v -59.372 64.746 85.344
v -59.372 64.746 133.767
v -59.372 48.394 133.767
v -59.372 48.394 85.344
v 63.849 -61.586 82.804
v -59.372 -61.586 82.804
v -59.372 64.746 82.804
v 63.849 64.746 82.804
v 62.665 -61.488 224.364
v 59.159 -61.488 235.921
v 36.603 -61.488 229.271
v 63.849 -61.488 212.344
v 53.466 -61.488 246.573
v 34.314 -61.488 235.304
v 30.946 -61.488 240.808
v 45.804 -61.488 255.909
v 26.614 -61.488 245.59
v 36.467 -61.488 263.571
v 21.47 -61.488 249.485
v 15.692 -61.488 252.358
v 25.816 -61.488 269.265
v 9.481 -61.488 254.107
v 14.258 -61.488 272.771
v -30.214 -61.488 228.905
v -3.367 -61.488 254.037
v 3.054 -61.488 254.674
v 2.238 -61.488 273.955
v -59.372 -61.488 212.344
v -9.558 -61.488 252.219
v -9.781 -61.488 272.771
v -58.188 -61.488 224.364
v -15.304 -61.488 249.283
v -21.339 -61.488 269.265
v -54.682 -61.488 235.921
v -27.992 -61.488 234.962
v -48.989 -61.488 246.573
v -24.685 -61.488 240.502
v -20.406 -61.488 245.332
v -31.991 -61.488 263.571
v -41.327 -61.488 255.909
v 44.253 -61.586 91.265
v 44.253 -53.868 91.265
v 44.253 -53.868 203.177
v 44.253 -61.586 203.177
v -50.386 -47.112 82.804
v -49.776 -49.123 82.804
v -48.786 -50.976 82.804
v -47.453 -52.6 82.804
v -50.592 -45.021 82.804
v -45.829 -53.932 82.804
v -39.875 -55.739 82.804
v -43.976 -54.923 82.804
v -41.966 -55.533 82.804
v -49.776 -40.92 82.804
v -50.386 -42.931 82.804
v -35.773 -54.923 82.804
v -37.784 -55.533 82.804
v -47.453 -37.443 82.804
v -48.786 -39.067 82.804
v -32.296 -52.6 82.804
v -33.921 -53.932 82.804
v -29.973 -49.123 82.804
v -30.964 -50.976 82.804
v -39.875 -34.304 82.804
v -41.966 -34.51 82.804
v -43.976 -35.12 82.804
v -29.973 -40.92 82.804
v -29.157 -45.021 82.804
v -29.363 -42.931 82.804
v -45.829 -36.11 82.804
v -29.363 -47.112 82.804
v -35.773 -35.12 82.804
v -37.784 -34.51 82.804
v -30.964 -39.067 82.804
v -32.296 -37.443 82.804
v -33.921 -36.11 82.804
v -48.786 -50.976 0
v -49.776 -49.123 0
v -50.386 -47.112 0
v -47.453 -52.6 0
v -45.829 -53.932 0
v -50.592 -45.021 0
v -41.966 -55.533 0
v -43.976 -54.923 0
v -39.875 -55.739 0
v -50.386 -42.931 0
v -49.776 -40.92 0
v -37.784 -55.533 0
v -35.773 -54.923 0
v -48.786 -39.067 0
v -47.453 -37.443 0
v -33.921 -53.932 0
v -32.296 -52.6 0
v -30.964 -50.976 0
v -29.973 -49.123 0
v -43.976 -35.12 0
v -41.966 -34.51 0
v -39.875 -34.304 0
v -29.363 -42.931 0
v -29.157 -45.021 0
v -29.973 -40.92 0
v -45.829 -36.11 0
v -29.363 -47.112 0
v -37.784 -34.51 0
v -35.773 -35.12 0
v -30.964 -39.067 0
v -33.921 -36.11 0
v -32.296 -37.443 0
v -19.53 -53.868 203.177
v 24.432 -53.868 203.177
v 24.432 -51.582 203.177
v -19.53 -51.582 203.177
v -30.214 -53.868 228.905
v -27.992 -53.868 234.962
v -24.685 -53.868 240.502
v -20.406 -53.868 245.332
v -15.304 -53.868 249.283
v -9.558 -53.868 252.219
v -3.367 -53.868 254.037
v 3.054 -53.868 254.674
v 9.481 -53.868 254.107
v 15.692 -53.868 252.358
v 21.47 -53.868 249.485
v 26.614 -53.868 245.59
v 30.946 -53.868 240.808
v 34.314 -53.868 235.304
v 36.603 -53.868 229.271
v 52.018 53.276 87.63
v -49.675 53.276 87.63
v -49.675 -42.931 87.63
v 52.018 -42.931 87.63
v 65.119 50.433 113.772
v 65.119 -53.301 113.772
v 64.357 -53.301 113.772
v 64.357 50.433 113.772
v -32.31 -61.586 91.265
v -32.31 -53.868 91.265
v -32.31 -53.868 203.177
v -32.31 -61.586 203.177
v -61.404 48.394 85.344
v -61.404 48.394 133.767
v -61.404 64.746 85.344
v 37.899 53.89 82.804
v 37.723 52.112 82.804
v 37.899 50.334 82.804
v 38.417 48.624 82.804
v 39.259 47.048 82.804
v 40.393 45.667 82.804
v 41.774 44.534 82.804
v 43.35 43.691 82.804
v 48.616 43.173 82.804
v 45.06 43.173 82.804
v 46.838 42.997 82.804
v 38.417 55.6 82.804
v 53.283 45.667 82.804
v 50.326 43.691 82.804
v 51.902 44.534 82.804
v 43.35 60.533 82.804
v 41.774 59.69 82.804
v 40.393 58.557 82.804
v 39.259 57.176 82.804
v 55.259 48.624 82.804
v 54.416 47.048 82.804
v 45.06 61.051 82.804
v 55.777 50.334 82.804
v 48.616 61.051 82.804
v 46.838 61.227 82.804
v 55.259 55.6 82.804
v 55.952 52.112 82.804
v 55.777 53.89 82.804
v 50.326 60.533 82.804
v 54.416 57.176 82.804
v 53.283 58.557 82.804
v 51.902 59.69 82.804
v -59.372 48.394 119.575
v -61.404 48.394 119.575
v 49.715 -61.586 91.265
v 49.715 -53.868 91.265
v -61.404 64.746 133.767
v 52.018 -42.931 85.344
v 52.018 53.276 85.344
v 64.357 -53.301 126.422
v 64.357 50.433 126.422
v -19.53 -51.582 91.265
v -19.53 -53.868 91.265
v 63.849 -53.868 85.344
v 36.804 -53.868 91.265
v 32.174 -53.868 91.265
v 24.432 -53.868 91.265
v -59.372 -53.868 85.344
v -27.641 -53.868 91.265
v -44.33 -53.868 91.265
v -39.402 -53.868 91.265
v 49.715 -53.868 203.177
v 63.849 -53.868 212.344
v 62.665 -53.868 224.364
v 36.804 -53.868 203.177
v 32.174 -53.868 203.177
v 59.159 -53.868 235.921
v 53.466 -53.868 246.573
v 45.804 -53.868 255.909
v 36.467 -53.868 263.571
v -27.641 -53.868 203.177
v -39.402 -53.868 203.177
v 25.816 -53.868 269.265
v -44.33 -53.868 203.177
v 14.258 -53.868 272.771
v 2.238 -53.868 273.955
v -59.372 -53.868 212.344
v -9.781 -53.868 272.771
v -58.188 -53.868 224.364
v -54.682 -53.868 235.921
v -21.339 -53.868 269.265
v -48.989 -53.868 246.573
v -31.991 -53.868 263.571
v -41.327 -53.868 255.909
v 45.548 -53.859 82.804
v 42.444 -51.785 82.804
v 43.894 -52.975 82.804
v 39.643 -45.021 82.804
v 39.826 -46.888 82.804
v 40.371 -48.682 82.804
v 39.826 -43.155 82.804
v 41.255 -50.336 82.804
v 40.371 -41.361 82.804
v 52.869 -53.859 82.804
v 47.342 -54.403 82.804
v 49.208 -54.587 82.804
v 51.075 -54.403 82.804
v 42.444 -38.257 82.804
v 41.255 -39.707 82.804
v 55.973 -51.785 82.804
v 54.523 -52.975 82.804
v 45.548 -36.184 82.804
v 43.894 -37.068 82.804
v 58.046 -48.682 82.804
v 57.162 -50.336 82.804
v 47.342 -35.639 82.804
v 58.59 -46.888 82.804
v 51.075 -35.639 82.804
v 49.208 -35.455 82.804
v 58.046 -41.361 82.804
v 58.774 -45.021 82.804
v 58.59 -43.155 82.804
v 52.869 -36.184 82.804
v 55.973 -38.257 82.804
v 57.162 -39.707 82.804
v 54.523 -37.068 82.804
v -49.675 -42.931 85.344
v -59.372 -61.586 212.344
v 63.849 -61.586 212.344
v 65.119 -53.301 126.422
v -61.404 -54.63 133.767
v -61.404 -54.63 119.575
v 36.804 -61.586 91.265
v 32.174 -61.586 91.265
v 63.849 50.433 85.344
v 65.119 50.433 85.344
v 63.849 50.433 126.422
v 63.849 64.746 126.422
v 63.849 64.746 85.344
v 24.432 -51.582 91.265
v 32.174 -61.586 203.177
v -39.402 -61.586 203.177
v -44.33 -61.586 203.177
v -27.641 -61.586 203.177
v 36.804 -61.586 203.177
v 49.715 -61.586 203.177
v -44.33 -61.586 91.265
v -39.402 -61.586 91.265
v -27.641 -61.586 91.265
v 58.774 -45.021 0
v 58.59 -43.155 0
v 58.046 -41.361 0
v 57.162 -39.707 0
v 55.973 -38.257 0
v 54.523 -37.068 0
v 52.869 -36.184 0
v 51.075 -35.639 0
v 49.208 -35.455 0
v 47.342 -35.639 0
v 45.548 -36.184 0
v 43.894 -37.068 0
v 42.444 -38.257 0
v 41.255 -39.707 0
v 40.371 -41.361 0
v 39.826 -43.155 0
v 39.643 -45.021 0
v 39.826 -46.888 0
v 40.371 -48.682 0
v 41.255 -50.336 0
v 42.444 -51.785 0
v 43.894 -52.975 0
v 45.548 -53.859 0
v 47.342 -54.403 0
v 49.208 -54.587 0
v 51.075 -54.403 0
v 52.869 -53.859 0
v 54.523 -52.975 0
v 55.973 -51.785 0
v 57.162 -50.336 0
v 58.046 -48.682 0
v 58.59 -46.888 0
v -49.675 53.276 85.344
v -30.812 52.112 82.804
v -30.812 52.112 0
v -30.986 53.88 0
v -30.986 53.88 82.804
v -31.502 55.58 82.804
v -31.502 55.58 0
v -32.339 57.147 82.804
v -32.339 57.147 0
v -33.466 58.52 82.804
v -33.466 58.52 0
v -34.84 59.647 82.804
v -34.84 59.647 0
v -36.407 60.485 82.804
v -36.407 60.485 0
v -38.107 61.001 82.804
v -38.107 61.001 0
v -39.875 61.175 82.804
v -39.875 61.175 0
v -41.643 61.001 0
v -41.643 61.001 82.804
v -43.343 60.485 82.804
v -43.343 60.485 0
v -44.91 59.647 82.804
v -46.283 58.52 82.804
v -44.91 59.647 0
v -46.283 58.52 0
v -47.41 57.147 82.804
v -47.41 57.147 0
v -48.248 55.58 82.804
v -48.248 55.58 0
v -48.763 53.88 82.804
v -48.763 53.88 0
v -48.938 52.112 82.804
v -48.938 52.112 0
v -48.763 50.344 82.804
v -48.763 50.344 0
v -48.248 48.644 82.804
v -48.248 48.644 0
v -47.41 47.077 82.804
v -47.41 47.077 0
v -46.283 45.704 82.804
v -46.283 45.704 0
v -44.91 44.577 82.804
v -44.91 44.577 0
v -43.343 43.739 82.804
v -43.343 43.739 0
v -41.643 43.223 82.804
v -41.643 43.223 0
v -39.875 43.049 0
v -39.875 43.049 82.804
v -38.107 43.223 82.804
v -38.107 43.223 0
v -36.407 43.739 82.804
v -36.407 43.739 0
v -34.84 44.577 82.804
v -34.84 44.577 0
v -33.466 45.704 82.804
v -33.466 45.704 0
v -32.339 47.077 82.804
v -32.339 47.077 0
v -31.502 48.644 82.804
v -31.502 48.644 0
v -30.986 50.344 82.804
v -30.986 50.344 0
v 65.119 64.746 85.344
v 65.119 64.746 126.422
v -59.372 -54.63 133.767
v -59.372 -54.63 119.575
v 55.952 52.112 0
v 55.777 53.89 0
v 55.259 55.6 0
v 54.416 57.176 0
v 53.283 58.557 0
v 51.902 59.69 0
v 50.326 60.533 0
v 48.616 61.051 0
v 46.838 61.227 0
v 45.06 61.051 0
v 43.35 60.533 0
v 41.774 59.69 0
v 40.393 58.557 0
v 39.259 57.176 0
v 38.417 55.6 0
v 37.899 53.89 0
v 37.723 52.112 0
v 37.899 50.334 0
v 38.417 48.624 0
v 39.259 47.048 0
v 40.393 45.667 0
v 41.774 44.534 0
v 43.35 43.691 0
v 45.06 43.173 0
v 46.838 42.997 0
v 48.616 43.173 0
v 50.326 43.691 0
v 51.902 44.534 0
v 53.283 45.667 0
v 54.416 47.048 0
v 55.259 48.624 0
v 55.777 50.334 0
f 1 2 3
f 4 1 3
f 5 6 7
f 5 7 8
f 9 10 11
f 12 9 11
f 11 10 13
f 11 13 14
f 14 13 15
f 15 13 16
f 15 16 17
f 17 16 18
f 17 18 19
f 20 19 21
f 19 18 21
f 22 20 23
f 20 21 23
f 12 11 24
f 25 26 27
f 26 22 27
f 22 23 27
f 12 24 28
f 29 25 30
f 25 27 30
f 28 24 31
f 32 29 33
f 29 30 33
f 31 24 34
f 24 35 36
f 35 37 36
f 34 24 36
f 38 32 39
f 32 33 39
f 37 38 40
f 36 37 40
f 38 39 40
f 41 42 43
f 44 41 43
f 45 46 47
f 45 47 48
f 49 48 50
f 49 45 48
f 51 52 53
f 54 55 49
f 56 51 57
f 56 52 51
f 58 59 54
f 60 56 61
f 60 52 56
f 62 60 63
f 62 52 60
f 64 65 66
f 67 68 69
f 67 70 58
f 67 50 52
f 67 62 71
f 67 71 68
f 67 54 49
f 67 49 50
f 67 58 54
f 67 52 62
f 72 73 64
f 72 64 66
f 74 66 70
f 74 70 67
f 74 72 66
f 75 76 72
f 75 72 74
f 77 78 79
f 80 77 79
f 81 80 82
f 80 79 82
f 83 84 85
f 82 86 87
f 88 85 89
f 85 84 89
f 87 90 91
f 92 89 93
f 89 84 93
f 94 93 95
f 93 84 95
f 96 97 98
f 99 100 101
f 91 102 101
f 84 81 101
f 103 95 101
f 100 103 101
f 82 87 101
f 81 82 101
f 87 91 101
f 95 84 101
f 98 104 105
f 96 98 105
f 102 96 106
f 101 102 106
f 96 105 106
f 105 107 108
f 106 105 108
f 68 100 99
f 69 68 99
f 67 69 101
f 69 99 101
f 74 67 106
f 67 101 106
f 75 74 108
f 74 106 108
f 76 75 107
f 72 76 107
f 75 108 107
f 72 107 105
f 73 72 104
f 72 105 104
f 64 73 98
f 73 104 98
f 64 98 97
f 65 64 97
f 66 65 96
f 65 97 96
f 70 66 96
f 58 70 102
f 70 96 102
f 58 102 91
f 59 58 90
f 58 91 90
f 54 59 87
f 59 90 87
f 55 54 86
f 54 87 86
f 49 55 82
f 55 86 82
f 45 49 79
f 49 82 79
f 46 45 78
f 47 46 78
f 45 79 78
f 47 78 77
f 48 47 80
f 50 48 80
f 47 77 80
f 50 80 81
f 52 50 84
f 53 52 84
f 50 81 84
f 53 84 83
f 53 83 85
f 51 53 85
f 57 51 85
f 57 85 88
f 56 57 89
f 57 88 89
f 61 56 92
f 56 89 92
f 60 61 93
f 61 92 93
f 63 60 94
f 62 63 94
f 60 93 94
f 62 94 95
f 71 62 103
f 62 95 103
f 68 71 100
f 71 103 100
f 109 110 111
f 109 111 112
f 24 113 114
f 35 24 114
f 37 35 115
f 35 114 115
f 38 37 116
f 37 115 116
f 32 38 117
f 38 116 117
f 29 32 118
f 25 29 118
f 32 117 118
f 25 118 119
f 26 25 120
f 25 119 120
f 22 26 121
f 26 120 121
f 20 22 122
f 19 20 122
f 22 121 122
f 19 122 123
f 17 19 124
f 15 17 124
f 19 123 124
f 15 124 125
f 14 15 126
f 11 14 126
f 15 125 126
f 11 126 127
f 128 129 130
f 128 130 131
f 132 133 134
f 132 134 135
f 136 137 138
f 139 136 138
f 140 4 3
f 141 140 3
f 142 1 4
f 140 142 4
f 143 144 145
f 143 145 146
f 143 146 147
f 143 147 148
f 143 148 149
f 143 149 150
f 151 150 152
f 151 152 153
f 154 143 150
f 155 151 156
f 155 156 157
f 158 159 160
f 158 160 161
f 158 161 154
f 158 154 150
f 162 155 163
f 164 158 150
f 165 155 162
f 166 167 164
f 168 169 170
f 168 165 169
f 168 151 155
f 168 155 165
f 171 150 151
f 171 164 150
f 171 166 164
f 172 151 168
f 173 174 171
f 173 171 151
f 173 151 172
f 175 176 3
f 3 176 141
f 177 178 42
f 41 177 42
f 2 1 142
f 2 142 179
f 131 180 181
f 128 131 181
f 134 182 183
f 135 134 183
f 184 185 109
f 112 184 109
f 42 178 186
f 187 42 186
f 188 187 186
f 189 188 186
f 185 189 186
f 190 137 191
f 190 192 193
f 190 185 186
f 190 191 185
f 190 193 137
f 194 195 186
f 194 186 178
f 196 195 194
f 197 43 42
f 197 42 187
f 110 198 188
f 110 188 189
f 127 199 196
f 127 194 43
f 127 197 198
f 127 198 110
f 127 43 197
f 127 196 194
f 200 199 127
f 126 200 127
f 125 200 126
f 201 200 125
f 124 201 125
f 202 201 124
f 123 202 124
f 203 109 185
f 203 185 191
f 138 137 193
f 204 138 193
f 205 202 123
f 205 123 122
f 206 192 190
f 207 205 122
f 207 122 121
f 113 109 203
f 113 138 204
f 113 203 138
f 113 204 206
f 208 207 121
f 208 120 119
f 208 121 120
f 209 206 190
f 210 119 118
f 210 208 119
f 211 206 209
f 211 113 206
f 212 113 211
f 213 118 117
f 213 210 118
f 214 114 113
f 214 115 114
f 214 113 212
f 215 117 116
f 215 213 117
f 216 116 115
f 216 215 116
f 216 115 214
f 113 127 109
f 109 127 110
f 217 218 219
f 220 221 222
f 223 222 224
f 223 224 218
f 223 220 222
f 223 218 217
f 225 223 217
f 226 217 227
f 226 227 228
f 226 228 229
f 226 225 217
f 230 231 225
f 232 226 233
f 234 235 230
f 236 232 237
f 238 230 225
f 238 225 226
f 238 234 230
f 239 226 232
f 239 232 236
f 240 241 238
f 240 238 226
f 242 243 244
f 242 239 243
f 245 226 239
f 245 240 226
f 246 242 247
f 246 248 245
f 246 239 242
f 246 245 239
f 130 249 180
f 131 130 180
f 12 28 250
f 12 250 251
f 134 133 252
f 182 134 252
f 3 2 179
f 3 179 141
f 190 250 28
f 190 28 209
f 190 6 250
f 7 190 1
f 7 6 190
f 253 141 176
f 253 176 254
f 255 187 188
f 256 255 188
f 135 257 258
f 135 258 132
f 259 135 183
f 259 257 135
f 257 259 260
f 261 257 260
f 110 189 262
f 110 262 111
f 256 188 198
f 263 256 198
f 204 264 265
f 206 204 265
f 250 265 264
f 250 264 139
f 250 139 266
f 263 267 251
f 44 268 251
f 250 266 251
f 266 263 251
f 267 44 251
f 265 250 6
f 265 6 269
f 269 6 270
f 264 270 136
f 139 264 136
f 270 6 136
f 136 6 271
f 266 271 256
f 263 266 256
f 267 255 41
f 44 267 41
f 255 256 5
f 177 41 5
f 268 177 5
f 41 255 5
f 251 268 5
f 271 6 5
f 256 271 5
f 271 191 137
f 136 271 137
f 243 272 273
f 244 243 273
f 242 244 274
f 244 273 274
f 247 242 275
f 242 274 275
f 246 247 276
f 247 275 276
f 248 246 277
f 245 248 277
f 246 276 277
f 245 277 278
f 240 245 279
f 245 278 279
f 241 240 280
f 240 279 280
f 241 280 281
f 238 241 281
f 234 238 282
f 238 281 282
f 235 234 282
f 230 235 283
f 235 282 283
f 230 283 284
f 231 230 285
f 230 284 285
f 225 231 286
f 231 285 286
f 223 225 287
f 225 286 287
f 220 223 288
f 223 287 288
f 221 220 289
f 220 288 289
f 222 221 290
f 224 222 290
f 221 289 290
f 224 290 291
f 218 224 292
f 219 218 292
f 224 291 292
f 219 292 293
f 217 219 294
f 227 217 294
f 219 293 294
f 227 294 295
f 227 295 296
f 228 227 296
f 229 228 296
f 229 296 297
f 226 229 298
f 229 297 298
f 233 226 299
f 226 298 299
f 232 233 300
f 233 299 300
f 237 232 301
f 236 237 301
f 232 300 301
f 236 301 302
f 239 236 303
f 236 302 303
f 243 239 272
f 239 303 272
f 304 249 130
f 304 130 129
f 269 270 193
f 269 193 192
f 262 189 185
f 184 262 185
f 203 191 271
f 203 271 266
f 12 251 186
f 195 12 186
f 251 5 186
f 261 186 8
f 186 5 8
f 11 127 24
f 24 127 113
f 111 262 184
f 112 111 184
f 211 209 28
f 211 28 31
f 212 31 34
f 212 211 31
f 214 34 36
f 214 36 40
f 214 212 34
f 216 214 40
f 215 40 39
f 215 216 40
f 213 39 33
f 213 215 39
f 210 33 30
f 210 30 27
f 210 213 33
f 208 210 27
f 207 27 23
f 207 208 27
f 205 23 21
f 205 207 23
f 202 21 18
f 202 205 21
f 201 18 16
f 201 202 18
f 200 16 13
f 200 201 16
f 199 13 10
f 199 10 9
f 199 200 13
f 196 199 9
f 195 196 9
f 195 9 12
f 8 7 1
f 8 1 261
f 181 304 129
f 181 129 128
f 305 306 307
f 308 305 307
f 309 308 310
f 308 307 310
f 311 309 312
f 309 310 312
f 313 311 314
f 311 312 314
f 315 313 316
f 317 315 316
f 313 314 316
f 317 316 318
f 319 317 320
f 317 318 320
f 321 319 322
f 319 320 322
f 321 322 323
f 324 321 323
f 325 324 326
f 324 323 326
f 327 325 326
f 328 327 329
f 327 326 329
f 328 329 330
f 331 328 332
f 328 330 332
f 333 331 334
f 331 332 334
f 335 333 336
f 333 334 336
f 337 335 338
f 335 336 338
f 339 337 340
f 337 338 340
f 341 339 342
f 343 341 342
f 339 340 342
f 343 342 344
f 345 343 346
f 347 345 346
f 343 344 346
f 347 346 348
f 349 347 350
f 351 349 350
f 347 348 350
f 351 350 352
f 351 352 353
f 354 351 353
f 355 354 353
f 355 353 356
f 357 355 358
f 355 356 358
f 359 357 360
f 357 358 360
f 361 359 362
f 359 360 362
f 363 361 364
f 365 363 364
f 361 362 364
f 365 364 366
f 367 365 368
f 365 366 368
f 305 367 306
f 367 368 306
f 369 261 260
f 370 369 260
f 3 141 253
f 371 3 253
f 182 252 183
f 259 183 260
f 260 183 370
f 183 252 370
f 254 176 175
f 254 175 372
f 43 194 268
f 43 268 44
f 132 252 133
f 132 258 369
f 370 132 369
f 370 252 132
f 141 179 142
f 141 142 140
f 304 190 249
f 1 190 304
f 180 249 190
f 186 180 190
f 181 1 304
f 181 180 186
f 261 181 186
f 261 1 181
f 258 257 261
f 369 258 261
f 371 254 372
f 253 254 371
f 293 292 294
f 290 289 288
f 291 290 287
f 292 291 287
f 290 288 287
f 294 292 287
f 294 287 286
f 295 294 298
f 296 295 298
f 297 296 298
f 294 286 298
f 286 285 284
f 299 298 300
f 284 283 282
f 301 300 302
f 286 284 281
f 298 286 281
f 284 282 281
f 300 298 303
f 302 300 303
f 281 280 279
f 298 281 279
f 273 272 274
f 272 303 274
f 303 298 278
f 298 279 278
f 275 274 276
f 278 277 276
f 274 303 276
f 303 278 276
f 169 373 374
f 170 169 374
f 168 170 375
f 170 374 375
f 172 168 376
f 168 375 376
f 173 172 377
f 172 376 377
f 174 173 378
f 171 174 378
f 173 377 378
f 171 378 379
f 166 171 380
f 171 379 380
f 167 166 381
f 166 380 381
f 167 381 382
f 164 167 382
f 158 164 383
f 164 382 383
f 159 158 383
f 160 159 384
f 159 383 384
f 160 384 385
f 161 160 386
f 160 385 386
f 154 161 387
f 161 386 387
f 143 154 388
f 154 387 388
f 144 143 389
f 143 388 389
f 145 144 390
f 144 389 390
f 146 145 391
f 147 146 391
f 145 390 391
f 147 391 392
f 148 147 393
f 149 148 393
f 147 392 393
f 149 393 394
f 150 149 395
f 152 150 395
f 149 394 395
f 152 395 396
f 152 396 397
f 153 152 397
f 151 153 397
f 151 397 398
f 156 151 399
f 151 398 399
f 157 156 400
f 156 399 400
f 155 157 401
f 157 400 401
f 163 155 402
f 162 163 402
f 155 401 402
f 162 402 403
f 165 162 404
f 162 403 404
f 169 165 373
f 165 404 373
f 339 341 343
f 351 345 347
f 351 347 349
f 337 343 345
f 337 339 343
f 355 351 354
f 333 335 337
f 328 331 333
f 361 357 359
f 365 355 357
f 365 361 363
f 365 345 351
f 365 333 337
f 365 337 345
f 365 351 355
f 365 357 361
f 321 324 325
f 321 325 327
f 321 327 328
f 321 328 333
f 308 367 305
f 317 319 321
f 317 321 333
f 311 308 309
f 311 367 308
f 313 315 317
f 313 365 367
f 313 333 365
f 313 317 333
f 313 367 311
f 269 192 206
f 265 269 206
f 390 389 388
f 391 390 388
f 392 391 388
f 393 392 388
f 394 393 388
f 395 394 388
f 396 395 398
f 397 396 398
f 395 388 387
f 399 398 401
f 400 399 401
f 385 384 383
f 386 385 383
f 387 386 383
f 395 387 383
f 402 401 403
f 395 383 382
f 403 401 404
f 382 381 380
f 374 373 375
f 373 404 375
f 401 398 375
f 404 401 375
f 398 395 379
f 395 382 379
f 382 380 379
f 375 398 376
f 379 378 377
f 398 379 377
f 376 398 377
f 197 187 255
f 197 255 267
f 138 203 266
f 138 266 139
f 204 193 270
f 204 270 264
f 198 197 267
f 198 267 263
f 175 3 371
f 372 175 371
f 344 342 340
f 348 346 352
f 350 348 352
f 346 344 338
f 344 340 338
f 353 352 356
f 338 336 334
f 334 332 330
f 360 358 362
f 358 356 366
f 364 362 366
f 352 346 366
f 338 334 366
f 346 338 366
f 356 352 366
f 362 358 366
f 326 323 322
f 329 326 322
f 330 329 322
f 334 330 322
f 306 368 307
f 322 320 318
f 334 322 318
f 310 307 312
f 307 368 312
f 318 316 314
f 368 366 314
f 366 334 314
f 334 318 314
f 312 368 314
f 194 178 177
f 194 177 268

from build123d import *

# Parameters (mm, degrees)
F0_R      = 9.062836
F0_R_2    = 10.71727
F0_R_3    = 9.565889
F0_R_4    = 9.114527
F1_DEPTH  = 82.804
F2_W      = 111.410721
F2_H      = 195.24283
F3_DEPTH  = 3.556
F5_W      = 90.162061
F5_H      = 141.660735
F6_DEPTH  = 2.032
F8_W      = 123.221182
F8_H      = 126.33267
F9_DEPTH  = 2.54
F10_W     = 123.221182
F10_H     = 7.71828
F11_DEPTH = 127
F12_W     = 5.462181
F12_H     = 111.911699
F13_DEPTH = 25.4
F14_W     = 4.629668
F14_H     = 111.911699
F15_DEPTH = 25.4
F16_W     = 4.928287
F16_H     = 111.911699
F17_DEPTH = 25.4
F18_W     = 4.668951
F18_H     = 111.911699
F19_DEPTH = 25.4
F20_W     = 14.313292
F20_H     = 41.077705
F21_DEPTH = 1.27
F22_W     = 103.73351
F22_H     = 12.649953
F23_DEPTH = 0.762
F24_W     = 16.352747
F24_H     = 48.423173
F25_DEPTH = 2.032
F26_W     = 103.02316
F26_H     = 14.192
F27_DEPTH = 2.032
F29_DEPTH = 7.62
F31_DEPTH = 25.4
F32_W     = 101.692434
F32_H     = 96.206847
F33_DEPTH = 2.286
F34_W     = 43.962076
F34_H     = 111.911699
F35_DEPTH = 2.286


with BuildPart() as f1:
    # F0 (on Top) → F1 (new body)
    with BuildSketch(Plane.XY):
        with Locations((-39.874714, 52.111991)):
            Circle(F0_R)
        with Locations((-39.874714, -45.021374)):
            Circle(F0_R_2)
        with Locations((49.208399, -45.021374)):
            Circle(F0_R_3)
        with Locations((46.837922, 52.111991)):
            Circle(F0_R_4)
    extrude(amount=F1_DEPTH)


with BuildPart() as f3:
    # F2 (on Top) → F3 (new body)
    with BuildSketch(Plane.XY):
        with Locations((67.96772, 198.11162)):
            Rectangle(F2_W, F2_H)
    extrude(amount=F3_DEPTH)


with BuildPart() as f6:
    # F5 (on Top) → F6 (new body)
    with BuildSketch(Plane.XY):
        with Locations((151.967335, 70.830367)):
            Rectangle(F5_W, F5_H)
    extrude(amount=F6_DEPTH)


with BuildPart() as f9:
    # F8 (on face) → F9 (new body)
    with BuildSketch(Plane.XY.offset(82.804)):
        with Locations((2.238404, 1.579948)):
            Rectangle(F8_W, F8_H)
    extrude(amount=F9_DEPTH)

    # F10 (on face) → F11 (join)
    with BuildSketch(Plane.XY.offset(85.344)):
        with Locations((2.238404, -57.727247)):
            Rectangle(F10_W, F10_H)
    extrude(amount=F11_DEPTH)

    # F12 (on face) → F13 (cut)
    with BuildSketch(Plane(origin=(0, -53.868107, 0), x_dir=(-1, 0, 0), z_dir=(0, 1, 0))):
        with Locations((-46.983683, 147.220754)):
            Rectangle(F12_W, F12_H)
    extrude(amount=-F13_DEPTH, mode=Mode.SUBTRACT)

    # F14 (on face) → F15 (cut)
    with BuildSketch(Plane(origin=(0, -53.868107, 0), x_dir=(-1, 0, 0), z_dir=(0, 1, 0))):
        with Locations((-34.488795, 147.220754)):
            Rectangle(F14_W, F14_H)
    extrude(amount=-F15_DEPTH, mode=Mode.SUBTRACT)

    # F16 (on face) → F17 (cut)
    with BuildSketch(Plane(origin=(0, -53.868107, 0), x_dir=(-1, 0, 0), z_dir=(0, 1, 0))):
        with Locations((41.865939, 147.220754)):
            Rectangle(F16_W, F16_H)
    extrude(amount=-F17_DEPTH, mode=Mode.SUBTRACT)

    # F18 (on face) → F19 (cut)
    with BuildSketch(Plane(origin=(0, -53.868107, 0), x_dir=(-1, 0, 0), z_dir=(0, 1, 0))):
        with Locations((29.975868, 147.220754)):
            Rectangle(F18_W, F18_H)
    extrude(amount=-F19_DEPTH, mode=Mode.SUBTRACT)

    # F28 (on face) → F29 (join)
    with BuildSketch(Plane(origin=(0, -53.868107, 0), x_dir=(-1, 0, 0), z_dir=(0, 1, 0))):
        with BuildLine():
            Line((-63.848995, 212.344), (59.372187, 212.344))
            ThreePointArc((59.372187, 212.344), (-2.238404, 273.954591), (-63.848995, 212.344))
        make_face()
    extrude(amount=-F29_DEPTH)

    # F30 (on face) → F31 (cut)
    with BuildSketch(Plane(origin=(0, -53.868107, 0), x_dir=(-1, 0, 0), z_dir=(0, 1, 0))):
        with BuildLine():
            Line((-36.602758, 229.271188), (30.214384, 228.904545))
            ThreePointArc((30.214384, 228.904545), (-3.053791, 254.673596), (-36.602758, 229.271188))
        make_face()
    extrude(amount=-F31_DEPTH, mode=Mode.SUBTRACT)

    # F32 (on face) → F33 (join)
    with BuildSketch(Plane.XY.offset(85.344)):
        with Locations((1.17152, 5.1725)):
            Rectangle(F32_W, F32_H)
    extrude(amount=F33_DEPTH)

    # F34 (on face) → F35 (join)
    with BuildSketch(Plane(origin=(0, -53.868107, 0), x_dir=(-1, 0, 0), z_dir=(0, 1, 0))):
        with Locations((-2.4506, 147.220754)):
            Rectangle(F34_W, F34_H)
    extrude(amount=F35_DEPTH)


with BuildPart() as f21:
    # F20 (on face) → F21 (new body)
    with BuildSketch(Plane.YZ.offset(63.848995)):
        with Locations((57.589637, 105.882852)):
            Rectangle(F20_W, F20_H)
    extrude(amount=F21_DEPTH)

    # F22 (on face) → F23 (join)
    with BuildSketch(Plane.YZ.offset(65.118995)):
        with Locations((-1.433764, 120.096728)):
            Rectangle(F22_W, F22_H)
    extrude(amount=-F23_DEPTH)


with BuildPart() as f25:
    # F24 (on face) → F25 (new body)
    with BuildSketch(Plane(origin=(-59.372187, 0, 0), x_dir=(0, -1, 0), z_dir=(-1, 0, 0))):
        with Locations((-56.569909, 109.555586)):
            Rectangle(F24_W, F24_H)
    extrude(amount=F25_DEPTH)


with BuildPart() as f27:
    # F26 (on face) → F27 (new body)
    with BuildSketch(Plane(origin=(-61.404187, 0, 0), x_dir=(0, -1, 0), z_dir=(-1, 0, 0))):
        with Locations((3.118044, 126.671173)):
            Rectangle(F26_W, F26_H)
    extrude(amount=-F27_DEPTH)


solid = Compound([f1.part, f9.part, f21.part, f25.part, f27.part])
